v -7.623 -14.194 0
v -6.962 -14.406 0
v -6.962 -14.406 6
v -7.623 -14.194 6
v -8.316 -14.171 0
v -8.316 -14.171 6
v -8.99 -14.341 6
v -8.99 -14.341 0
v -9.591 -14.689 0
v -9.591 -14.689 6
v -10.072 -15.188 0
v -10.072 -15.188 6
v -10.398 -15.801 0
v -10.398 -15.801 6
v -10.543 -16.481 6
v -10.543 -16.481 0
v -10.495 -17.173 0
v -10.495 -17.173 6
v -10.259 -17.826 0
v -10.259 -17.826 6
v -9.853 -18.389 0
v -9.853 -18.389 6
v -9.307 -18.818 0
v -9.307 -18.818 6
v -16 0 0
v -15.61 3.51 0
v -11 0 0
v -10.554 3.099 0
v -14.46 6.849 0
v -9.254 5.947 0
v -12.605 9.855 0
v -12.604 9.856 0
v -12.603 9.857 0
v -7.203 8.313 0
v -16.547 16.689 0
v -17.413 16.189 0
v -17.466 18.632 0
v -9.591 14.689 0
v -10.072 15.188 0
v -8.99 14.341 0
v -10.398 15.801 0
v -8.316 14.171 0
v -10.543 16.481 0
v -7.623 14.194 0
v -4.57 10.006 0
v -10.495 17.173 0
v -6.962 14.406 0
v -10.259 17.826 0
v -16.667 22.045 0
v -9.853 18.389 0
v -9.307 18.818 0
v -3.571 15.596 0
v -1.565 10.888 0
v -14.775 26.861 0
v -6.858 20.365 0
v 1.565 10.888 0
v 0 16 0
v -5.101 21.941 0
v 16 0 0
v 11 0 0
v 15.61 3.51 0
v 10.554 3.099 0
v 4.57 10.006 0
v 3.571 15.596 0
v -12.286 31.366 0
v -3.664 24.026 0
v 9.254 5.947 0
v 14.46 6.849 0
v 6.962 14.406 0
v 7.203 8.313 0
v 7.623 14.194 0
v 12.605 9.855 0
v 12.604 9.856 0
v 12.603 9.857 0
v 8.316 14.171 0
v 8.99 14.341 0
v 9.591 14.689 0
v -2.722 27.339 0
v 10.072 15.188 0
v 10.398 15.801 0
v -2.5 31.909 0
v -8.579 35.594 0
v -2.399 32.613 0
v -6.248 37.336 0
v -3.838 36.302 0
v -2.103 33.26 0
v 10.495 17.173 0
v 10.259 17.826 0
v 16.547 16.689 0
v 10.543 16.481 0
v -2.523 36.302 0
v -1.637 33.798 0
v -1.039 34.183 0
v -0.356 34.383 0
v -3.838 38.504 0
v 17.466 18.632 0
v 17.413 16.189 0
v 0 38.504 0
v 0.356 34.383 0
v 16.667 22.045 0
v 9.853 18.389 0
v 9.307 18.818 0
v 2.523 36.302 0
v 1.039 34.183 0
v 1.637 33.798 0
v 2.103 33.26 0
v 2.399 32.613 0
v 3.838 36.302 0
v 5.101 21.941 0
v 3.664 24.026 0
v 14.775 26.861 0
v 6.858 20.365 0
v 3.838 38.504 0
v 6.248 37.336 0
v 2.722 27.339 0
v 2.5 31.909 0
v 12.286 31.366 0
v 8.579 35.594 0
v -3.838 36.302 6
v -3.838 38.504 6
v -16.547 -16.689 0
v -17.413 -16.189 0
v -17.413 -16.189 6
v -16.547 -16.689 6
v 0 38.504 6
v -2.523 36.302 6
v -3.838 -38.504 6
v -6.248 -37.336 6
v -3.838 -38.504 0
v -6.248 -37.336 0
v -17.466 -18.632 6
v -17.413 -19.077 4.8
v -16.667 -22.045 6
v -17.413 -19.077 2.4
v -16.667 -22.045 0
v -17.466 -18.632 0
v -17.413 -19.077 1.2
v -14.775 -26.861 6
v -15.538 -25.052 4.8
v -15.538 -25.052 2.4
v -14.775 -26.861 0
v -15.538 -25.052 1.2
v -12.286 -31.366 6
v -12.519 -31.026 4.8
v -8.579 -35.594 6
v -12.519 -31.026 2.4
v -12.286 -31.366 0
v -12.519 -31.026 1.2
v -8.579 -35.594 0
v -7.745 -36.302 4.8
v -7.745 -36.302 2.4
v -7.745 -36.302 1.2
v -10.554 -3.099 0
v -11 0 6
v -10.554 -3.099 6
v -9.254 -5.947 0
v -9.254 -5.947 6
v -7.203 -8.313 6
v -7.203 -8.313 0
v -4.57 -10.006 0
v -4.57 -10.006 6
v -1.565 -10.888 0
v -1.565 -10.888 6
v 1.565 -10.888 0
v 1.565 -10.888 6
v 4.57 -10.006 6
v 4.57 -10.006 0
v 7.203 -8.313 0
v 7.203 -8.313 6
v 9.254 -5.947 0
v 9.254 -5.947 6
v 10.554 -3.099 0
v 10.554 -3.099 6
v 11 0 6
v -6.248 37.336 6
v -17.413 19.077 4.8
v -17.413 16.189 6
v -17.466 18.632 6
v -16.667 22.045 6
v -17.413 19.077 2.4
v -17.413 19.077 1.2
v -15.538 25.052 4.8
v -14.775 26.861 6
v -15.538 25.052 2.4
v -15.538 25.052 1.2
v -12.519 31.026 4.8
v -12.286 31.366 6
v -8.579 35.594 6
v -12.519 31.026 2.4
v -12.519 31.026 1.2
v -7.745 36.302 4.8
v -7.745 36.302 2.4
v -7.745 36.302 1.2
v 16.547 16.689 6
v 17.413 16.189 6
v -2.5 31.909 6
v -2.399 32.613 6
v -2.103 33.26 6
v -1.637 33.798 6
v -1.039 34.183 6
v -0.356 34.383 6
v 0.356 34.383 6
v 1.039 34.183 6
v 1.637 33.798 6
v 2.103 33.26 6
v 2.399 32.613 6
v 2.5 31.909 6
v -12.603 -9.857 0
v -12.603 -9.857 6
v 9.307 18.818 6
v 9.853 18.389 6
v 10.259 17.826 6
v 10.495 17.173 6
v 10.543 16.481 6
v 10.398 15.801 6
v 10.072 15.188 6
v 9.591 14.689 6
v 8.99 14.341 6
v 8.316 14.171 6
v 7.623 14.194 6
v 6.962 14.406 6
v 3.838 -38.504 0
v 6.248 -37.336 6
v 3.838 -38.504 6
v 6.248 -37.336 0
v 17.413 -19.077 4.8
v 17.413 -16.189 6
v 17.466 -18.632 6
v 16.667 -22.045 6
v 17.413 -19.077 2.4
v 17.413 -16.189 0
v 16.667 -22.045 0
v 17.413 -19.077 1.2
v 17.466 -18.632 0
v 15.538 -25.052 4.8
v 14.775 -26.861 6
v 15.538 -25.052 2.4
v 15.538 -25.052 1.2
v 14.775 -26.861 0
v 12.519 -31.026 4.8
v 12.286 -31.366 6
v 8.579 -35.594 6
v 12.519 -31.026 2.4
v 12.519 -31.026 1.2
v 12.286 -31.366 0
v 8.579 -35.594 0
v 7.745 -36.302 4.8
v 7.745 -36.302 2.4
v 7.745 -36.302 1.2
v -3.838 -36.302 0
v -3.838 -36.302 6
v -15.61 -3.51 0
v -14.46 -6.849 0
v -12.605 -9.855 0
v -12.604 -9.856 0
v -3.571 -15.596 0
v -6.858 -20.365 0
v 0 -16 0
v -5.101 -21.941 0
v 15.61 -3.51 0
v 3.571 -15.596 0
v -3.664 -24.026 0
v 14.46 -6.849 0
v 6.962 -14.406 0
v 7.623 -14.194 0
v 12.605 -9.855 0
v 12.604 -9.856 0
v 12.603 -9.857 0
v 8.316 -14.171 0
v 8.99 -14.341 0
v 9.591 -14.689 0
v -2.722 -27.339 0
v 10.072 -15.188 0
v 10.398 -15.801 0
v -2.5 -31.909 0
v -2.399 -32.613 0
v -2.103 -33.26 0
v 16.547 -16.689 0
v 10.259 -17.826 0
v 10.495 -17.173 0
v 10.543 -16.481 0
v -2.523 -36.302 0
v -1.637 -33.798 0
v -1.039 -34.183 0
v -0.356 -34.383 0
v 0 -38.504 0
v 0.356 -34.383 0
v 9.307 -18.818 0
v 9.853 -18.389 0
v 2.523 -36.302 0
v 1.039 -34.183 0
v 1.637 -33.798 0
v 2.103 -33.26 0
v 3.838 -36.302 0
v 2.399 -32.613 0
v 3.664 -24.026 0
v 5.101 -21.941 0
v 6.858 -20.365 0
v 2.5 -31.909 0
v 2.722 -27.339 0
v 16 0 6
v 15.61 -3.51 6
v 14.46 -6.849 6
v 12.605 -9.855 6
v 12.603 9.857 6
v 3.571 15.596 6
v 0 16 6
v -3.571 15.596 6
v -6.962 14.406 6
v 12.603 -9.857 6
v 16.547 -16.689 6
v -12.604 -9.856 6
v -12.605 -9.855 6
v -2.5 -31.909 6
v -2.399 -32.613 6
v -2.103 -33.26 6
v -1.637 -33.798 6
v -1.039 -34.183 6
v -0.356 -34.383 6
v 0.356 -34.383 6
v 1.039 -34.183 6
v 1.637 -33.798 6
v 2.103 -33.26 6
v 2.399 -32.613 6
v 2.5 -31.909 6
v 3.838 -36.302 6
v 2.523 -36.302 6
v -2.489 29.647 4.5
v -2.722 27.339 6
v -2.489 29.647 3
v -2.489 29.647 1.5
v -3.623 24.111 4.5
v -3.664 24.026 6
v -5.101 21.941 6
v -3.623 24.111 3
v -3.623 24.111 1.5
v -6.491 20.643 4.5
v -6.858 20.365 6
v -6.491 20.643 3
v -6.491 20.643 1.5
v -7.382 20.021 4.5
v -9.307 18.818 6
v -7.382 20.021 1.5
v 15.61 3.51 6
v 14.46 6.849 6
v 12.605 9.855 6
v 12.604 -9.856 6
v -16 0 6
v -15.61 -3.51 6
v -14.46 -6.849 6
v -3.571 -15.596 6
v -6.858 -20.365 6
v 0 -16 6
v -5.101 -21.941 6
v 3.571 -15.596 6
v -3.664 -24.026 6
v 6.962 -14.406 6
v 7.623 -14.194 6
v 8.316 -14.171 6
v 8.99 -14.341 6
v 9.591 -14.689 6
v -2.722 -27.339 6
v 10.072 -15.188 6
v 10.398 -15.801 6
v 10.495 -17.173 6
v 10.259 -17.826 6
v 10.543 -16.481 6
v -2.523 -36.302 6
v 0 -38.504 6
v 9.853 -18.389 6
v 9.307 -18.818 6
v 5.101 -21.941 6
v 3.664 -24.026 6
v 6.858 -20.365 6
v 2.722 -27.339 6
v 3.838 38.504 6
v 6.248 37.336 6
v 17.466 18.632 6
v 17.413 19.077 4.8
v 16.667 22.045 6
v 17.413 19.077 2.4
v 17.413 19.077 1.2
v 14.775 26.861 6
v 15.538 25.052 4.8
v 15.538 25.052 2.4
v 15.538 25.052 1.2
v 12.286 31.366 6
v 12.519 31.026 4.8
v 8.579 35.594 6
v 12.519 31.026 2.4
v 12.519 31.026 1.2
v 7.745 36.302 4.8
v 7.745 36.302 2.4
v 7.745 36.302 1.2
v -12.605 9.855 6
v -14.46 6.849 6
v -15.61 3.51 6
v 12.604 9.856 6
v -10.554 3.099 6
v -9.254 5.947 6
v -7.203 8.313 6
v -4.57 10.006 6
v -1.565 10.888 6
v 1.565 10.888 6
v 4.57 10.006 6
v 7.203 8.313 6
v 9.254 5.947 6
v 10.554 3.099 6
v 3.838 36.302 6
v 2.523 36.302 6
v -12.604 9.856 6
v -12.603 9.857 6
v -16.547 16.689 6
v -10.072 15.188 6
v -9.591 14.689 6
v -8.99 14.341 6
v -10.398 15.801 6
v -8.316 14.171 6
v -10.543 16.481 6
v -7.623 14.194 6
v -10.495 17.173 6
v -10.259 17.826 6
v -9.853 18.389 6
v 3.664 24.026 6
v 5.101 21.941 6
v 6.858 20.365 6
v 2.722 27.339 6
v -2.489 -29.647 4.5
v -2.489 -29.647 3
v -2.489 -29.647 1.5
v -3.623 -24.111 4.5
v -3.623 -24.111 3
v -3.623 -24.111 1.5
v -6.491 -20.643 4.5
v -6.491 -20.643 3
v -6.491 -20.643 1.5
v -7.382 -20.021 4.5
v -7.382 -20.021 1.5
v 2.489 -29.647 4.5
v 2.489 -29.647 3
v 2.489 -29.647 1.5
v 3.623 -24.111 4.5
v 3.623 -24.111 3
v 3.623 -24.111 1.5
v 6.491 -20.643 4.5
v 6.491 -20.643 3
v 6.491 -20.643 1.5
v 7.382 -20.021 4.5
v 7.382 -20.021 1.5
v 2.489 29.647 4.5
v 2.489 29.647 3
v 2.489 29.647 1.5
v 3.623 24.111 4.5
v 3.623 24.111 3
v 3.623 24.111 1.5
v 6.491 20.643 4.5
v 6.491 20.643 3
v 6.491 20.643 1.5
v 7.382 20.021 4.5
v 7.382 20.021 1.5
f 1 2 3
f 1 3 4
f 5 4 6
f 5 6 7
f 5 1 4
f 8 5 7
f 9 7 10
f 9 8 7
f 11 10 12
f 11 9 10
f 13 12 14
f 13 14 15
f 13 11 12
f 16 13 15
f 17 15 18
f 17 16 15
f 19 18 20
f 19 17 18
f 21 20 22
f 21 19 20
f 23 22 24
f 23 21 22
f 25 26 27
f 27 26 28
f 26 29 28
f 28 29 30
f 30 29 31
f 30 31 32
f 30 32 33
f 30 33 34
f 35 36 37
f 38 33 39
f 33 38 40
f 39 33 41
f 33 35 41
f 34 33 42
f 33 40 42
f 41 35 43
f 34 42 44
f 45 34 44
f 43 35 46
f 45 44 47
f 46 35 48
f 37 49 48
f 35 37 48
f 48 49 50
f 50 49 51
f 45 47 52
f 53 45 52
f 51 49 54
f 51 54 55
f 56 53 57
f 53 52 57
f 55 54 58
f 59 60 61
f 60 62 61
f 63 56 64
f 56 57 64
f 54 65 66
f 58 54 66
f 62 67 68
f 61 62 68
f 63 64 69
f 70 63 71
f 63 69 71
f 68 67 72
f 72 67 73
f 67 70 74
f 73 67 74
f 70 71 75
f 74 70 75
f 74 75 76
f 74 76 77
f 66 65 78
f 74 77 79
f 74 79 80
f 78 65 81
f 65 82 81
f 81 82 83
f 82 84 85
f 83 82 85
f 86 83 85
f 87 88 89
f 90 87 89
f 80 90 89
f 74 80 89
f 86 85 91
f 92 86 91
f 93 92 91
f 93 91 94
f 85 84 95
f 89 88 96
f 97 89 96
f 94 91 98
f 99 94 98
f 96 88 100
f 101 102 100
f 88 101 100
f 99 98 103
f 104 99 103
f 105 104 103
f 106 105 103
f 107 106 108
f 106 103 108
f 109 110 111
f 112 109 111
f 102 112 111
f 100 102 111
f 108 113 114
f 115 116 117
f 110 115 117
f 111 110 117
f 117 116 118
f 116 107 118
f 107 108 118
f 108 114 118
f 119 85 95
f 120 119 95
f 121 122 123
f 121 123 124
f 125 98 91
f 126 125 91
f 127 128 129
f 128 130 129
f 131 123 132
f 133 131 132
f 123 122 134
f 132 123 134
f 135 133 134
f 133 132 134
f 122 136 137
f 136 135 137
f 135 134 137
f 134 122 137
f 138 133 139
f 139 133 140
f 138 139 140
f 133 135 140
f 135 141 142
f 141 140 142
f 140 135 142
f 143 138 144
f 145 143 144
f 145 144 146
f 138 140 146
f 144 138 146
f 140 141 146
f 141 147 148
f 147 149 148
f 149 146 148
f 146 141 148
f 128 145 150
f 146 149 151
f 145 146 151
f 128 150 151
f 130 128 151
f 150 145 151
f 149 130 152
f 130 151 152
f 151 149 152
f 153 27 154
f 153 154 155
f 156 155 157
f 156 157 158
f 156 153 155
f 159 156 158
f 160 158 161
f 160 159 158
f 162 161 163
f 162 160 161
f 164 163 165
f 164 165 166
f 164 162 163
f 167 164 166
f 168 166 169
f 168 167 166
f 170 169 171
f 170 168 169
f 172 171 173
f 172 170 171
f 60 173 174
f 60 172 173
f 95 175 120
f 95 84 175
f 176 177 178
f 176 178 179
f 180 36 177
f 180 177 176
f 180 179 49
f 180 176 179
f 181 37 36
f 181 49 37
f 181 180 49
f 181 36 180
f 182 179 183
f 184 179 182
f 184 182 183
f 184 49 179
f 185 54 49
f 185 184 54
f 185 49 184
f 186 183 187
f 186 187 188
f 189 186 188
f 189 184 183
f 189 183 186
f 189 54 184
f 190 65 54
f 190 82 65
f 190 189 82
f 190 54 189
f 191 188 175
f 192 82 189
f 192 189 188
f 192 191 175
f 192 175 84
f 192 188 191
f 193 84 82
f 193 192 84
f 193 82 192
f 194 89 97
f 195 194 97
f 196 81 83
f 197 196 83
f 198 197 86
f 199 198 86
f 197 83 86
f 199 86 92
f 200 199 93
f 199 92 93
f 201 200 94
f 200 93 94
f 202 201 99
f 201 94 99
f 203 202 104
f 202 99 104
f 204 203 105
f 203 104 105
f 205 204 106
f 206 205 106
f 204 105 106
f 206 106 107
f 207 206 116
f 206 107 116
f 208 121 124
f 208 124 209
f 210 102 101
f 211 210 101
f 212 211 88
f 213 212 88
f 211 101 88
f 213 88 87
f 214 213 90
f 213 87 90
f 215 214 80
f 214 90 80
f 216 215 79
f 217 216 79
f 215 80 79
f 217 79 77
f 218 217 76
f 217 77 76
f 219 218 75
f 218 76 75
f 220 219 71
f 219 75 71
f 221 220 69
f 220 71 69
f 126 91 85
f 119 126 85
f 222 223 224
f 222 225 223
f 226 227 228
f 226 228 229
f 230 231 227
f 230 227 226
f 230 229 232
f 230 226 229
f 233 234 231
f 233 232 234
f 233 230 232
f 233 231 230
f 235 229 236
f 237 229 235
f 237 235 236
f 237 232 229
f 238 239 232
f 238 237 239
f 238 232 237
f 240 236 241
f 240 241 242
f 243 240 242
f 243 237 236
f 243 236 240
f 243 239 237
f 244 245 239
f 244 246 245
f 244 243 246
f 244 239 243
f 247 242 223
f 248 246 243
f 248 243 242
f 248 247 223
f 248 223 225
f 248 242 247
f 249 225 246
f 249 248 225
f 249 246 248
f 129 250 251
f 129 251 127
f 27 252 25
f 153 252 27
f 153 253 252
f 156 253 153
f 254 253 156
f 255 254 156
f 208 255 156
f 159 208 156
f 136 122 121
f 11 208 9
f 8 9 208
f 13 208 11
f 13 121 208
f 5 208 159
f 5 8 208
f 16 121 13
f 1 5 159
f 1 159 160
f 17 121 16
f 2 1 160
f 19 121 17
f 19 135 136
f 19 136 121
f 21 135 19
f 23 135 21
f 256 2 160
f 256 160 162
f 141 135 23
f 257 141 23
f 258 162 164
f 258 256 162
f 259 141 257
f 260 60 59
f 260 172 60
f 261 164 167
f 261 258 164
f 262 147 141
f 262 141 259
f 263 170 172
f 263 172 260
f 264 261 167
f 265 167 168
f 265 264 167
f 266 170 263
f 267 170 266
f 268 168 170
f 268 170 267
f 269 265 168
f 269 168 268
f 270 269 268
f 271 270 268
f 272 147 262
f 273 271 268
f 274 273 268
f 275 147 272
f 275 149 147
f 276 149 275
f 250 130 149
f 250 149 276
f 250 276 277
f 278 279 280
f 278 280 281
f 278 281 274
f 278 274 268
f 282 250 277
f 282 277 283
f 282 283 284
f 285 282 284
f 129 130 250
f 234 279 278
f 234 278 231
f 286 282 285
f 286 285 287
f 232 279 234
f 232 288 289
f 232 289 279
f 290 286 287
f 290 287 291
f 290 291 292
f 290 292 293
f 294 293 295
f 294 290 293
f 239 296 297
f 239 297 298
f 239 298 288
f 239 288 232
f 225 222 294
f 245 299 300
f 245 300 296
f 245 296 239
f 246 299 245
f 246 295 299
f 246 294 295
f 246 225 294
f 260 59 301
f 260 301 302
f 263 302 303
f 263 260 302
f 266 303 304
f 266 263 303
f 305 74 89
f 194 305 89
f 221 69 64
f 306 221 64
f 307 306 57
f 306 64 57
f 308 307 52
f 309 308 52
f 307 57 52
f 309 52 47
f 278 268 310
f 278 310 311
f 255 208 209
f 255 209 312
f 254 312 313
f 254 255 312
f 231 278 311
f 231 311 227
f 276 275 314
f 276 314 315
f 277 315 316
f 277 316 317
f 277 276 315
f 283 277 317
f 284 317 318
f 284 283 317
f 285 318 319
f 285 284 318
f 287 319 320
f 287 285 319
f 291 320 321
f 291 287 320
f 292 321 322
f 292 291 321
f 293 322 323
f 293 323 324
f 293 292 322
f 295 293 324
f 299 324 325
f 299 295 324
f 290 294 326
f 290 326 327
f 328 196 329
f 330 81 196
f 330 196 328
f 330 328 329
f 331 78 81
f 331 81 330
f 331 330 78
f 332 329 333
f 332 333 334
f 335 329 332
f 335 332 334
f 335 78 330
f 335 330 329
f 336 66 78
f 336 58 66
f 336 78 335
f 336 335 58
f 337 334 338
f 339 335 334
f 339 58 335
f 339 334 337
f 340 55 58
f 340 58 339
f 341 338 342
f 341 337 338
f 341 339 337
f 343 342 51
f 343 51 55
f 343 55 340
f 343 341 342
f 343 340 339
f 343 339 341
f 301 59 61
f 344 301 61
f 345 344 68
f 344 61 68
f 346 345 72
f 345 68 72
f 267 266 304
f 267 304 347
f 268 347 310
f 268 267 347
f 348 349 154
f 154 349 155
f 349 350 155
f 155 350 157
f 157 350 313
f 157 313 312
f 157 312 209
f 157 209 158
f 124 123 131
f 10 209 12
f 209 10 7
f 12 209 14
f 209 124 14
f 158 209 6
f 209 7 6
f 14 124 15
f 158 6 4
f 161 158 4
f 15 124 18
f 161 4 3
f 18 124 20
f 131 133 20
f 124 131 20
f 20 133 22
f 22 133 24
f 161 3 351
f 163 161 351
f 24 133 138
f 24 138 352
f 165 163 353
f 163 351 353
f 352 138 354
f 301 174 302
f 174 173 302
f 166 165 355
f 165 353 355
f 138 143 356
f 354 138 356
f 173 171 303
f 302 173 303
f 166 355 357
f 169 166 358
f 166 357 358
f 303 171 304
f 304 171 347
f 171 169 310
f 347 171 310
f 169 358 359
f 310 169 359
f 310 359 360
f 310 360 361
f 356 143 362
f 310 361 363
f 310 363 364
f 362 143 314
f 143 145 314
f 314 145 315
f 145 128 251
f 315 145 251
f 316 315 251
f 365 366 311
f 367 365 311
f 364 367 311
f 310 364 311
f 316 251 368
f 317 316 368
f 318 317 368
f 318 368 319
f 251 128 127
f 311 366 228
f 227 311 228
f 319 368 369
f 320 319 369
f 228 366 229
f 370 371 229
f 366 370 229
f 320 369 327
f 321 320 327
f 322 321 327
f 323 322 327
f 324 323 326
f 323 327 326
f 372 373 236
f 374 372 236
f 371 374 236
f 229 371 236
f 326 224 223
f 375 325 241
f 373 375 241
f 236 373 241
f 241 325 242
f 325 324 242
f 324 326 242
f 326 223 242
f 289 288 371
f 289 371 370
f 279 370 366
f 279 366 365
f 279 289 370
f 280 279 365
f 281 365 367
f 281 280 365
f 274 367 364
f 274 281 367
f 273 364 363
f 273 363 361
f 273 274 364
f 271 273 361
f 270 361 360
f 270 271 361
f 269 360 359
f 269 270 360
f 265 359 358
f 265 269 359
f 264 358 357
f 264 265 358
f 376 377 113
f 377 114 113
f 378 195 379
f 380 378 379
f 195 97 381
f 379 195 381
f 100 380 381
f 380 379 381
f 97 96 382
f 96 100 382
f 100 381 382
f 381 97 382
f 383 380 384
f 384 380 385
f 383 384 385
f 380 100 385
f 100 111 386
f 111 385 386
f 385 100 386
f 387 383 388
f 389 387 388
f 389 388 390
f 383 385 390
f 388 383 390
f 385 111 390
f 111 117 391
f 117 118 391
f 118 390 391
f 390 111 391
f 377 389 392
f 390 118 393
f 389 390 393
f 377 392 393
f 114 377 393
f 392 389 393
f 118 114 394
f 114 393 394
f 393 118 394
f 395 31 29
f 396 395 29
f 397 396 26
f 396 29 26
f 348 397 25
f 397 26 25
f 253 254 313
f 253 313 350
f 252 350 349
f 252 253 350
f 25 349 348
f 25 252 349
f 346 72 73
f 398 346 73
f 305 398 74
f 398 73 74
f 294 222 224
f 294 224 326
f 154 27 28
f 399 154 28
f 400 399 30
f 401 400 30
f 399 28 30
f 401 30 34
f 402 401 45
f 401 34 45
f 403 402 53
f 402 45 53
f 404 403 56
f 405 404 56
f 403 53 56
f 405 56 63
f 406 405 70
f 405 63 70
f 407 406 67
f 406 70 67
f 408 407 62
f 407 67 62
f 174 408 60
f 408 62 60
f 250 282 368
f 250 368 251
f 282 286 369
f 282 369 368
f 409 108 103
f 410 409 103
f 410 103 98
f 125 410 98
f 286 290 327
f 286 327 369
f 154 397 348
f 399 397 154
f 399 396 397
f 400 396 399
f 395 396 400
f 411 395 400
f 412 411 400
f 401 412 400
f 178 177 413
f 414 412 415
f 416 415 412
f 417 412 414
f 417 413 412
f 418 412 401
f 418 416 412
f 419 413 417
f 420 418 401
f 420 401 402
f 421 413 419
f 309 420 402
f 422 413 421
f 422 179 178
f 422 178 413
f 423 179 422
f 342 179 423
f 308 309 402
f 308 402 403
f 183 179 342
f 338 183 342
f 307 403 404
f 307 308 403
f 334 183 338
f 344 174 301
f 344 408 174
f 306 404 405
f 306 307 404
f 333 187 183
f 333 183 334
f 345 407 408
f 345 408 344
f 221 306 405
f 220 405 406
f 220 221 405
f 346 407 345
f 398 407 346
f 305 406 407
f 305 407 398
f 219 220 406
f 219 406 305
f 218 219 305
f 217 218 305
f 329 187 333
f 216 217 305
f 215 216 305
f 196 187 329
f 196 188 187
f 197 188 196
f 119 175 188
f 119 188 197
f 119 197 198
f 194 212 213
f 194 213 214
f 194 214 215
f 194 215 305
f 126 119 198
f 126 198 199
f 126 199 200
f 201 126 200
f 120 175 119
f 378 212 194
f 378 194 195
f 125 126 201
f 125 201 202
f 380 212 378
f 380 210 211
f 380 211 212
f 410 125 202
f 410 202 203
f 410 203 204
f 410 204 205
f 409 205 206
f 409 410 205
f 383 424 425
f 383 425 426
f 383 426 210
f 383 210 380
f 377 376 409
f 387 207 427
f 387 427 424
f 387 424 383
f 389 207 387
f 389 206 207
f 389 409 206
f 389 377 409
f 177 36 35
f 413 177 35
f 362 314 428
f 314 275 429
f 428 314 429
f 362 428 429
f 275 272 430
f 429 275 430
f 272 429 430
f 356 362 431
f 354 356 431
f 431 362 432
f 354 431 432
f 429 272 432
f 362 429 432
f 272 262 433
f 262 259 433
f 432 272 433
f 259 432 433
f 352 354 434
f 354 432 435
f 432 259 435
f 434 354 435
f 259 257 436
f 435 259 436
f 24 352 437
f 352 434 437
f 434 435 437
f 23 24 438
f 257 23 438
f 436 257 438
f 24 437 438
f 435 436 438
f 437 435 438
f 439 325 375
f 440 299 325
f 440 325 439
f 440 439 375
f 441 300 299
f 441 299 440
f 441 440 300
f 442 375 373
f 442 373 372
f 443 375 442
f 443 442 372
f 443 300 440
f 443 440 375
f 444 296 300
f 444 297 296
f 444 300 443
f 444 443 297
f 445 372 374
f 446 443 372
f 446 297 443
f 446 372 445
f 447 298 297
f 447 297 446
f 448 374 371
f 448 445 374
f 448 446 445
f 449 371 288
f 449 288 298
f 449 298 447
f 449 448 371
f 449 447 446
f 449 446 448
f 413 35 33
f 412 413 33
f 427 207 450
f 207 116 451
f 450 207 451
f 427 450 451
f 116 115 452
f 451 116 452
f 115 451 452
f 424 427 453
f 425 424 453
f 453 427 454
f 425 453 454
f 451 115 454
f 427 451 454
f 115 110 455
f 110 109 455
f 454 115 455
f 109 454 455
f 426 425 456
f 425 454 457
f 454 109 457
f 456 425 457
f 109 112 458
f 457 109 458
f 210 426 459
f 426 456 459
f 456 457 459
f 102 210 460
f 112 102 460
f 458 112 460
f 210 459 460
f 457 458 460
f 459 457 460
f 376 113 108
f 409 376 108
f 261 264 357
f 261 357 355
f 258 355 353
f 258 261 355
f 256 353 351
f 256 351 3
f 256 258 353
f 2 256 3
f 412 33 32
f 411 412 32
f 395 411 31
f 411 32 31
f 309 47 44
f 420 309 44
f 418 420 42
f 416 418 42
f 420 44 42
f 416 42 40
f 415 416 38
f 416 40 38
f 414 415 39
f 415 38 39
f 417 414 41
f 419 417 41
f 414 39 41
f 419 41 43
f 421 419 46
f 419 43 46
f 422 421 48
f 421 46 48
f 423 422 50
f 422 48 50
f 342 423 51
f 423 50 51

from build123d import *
from build123d import SkipClean  # not in build123d's __all__

# Parameters (mm, degrees)
F1_DEPTH = 6


# Not quite as in the source:
# - a pattern or mirror of a feature is missing from the dataset's text; its kind, count and spacing are read off the source's solid


with BuildPart() as f1:
    # F0 (on Top) → F1 (new body)
    with BuildSketch(Plane.XY):
        with BuildLine():
            Line((11, 0), (16, 0))
            ThreePointArc((16, 0), (15.1274260959, 5.2116196823), (12.6048775359, 9.854798948))
            ThreePointArc((12.6048775359, 9.854798948), (12.6039156913, 9.856029081), (12.6029537267, 9.8572591203))
            Line((12.6029537267, 9.8572591203), (16.5472631752, 16.6890034859))
            Line((16.5472631752, 16.6890034859), (17.413288579, 16.1890034859))
            add(Edge.make_bspline(
                [(17.413288579, 16.1890034859), (17.5041916061, 16.8045773234), (17.7045445822, 19.4085508868), (15.5298067399, 25.2595570372), (12.9266999082, 31.0960374777), (7.9390301641, 36.5896284217), (5.2735054472, 37.9125925094), (3.8379400503, 38.5036543012)],
                knots=[0, 0, 0, 0, 0.1468390725, 0.3630340887, 0.5865738984, 0.8170443021, 1, 1, 1, 1], degree=3))
            Line((3.8379400503, 38.5036543012), (3.8379400503, 36.3024744126))
            Line((3.8379400503, 36.3024744126), (2.5230119528, 36.3024744126))
            Line((2.5230119528, 36.3024744126), (0, 38.5036543012))
            Line((0, 38.5036543012), (-2.5230119528, 36.3024744126))
            Line((-2.5230119528, 36.3024744126), (-3.8379400503, 36.3024744126))
            Line((-3.8379400503, 36.3024744126), (-3.8379400503, 38.5036543012))
            add(Edge.make_bspline(
                [(-17.413288579, 16.1890034859), (-17.5041916061, 16.8045773234), (-17.7045445822, 19.4085508868), (-15.5298067399, 25.2595570372), (-12.9266999082, 31.0960374777), (-7.9390301641, 36.5896284217), (-5.2735054472, 37.9125925094), (-3.8379400503, 38.5036543012)],
                knots=[0, 0, 0, 0, 0.1468390725, 0.3630340887, 0.5865738984, 0.8170443021, 1, 1, 1, 1], degree=3))
            Line((-17.413288579, 16.1890034859), (-16.5472631752, 16.6890034859))
            Line((-16.5472631752, 16.6890034859), (-12.6029537267, 9.8572591203))
            ThreePointArc((-12.6029537267, 9.8572591203), (-12.6039156913, 9.856029081), (-12.6048775359, 9.854798948))
            ThreePointArc((-12.6048775359, 9.854798948), (-15.1274260959, 5.2116196823), (-16, 0))
            Line((-16, 0), (-11, 0))
            ThreePointArc((-11, 0), (0, 11), (11, 0))
        make_face()
        with BuildLine():
            ThreePointArc((-2.5, 31.9088473916), (0, 34.4088473916), (2.5, 31.9088473916))
            add(Edge.make_bspline(
                [(2.5, 31.9088473916), (2.4331220889, 30.6490394363), (2.4535157828, 30.0127263526), (2.8986373466, 23.7894092903), (6.9226723271, 20.1849518953), (7.2970524444, 20.0978087891), (9.3067939396, 18.8178154736)],
                knots=[0, 0, 0, 0, 0.191959096, 0.4953854958, 0.7661719362, 1, 1, 1, 1], degree=3))
            ThreePointArc((9.3067939396, 18.8178154736), (10.2567995477, 15.4836064725), (6.9615764655, 14.4061255414))
            ThreePointArc((6.9615764655, 14.4061255414), (0, 16), (-6.9615764655, 14.4061255414))
            ThreePointArc((-6.9615764655, 14.4061255414), (-10.2567995477, 15.4836064725), (-9.3067939396, 18.8178154736))
            add(Edge.make_bspline(
                [(-2.5, 31.9088473916), (-2.4331220889, 30.6490394363), (-2.4535157828, 30.0127263526), (-2.8986373466, 23.7894092903), (-6.9226723271, 20.1849518953), (-7.2970524444, 20.0978087891), (-9.3067939396, 18.8178154736)],
                knots=[0, 0, 0, 0, 0.191959096, 0.4953854958, 0.7661719362, 1, 1, 1, 1], degree=3))
        make_face(mode=Mode.SUBTRACT)
    extrude(amount=F1_DEPTH)

    # F1_copies: F1 across plane


with BuildPart() as f1_1:
    add(f1.part, clean=False)
    with SkipClean():  # cleaning this boolean's faces spoils the solid; the shape is the same uncleaned
        add(f1.part.mirror(Plane(origin=(0, 0, 0), x_dir=(0, 0, -1), z_dir=(0, -1, 0))), clean=False)


solid = f1_1.part
